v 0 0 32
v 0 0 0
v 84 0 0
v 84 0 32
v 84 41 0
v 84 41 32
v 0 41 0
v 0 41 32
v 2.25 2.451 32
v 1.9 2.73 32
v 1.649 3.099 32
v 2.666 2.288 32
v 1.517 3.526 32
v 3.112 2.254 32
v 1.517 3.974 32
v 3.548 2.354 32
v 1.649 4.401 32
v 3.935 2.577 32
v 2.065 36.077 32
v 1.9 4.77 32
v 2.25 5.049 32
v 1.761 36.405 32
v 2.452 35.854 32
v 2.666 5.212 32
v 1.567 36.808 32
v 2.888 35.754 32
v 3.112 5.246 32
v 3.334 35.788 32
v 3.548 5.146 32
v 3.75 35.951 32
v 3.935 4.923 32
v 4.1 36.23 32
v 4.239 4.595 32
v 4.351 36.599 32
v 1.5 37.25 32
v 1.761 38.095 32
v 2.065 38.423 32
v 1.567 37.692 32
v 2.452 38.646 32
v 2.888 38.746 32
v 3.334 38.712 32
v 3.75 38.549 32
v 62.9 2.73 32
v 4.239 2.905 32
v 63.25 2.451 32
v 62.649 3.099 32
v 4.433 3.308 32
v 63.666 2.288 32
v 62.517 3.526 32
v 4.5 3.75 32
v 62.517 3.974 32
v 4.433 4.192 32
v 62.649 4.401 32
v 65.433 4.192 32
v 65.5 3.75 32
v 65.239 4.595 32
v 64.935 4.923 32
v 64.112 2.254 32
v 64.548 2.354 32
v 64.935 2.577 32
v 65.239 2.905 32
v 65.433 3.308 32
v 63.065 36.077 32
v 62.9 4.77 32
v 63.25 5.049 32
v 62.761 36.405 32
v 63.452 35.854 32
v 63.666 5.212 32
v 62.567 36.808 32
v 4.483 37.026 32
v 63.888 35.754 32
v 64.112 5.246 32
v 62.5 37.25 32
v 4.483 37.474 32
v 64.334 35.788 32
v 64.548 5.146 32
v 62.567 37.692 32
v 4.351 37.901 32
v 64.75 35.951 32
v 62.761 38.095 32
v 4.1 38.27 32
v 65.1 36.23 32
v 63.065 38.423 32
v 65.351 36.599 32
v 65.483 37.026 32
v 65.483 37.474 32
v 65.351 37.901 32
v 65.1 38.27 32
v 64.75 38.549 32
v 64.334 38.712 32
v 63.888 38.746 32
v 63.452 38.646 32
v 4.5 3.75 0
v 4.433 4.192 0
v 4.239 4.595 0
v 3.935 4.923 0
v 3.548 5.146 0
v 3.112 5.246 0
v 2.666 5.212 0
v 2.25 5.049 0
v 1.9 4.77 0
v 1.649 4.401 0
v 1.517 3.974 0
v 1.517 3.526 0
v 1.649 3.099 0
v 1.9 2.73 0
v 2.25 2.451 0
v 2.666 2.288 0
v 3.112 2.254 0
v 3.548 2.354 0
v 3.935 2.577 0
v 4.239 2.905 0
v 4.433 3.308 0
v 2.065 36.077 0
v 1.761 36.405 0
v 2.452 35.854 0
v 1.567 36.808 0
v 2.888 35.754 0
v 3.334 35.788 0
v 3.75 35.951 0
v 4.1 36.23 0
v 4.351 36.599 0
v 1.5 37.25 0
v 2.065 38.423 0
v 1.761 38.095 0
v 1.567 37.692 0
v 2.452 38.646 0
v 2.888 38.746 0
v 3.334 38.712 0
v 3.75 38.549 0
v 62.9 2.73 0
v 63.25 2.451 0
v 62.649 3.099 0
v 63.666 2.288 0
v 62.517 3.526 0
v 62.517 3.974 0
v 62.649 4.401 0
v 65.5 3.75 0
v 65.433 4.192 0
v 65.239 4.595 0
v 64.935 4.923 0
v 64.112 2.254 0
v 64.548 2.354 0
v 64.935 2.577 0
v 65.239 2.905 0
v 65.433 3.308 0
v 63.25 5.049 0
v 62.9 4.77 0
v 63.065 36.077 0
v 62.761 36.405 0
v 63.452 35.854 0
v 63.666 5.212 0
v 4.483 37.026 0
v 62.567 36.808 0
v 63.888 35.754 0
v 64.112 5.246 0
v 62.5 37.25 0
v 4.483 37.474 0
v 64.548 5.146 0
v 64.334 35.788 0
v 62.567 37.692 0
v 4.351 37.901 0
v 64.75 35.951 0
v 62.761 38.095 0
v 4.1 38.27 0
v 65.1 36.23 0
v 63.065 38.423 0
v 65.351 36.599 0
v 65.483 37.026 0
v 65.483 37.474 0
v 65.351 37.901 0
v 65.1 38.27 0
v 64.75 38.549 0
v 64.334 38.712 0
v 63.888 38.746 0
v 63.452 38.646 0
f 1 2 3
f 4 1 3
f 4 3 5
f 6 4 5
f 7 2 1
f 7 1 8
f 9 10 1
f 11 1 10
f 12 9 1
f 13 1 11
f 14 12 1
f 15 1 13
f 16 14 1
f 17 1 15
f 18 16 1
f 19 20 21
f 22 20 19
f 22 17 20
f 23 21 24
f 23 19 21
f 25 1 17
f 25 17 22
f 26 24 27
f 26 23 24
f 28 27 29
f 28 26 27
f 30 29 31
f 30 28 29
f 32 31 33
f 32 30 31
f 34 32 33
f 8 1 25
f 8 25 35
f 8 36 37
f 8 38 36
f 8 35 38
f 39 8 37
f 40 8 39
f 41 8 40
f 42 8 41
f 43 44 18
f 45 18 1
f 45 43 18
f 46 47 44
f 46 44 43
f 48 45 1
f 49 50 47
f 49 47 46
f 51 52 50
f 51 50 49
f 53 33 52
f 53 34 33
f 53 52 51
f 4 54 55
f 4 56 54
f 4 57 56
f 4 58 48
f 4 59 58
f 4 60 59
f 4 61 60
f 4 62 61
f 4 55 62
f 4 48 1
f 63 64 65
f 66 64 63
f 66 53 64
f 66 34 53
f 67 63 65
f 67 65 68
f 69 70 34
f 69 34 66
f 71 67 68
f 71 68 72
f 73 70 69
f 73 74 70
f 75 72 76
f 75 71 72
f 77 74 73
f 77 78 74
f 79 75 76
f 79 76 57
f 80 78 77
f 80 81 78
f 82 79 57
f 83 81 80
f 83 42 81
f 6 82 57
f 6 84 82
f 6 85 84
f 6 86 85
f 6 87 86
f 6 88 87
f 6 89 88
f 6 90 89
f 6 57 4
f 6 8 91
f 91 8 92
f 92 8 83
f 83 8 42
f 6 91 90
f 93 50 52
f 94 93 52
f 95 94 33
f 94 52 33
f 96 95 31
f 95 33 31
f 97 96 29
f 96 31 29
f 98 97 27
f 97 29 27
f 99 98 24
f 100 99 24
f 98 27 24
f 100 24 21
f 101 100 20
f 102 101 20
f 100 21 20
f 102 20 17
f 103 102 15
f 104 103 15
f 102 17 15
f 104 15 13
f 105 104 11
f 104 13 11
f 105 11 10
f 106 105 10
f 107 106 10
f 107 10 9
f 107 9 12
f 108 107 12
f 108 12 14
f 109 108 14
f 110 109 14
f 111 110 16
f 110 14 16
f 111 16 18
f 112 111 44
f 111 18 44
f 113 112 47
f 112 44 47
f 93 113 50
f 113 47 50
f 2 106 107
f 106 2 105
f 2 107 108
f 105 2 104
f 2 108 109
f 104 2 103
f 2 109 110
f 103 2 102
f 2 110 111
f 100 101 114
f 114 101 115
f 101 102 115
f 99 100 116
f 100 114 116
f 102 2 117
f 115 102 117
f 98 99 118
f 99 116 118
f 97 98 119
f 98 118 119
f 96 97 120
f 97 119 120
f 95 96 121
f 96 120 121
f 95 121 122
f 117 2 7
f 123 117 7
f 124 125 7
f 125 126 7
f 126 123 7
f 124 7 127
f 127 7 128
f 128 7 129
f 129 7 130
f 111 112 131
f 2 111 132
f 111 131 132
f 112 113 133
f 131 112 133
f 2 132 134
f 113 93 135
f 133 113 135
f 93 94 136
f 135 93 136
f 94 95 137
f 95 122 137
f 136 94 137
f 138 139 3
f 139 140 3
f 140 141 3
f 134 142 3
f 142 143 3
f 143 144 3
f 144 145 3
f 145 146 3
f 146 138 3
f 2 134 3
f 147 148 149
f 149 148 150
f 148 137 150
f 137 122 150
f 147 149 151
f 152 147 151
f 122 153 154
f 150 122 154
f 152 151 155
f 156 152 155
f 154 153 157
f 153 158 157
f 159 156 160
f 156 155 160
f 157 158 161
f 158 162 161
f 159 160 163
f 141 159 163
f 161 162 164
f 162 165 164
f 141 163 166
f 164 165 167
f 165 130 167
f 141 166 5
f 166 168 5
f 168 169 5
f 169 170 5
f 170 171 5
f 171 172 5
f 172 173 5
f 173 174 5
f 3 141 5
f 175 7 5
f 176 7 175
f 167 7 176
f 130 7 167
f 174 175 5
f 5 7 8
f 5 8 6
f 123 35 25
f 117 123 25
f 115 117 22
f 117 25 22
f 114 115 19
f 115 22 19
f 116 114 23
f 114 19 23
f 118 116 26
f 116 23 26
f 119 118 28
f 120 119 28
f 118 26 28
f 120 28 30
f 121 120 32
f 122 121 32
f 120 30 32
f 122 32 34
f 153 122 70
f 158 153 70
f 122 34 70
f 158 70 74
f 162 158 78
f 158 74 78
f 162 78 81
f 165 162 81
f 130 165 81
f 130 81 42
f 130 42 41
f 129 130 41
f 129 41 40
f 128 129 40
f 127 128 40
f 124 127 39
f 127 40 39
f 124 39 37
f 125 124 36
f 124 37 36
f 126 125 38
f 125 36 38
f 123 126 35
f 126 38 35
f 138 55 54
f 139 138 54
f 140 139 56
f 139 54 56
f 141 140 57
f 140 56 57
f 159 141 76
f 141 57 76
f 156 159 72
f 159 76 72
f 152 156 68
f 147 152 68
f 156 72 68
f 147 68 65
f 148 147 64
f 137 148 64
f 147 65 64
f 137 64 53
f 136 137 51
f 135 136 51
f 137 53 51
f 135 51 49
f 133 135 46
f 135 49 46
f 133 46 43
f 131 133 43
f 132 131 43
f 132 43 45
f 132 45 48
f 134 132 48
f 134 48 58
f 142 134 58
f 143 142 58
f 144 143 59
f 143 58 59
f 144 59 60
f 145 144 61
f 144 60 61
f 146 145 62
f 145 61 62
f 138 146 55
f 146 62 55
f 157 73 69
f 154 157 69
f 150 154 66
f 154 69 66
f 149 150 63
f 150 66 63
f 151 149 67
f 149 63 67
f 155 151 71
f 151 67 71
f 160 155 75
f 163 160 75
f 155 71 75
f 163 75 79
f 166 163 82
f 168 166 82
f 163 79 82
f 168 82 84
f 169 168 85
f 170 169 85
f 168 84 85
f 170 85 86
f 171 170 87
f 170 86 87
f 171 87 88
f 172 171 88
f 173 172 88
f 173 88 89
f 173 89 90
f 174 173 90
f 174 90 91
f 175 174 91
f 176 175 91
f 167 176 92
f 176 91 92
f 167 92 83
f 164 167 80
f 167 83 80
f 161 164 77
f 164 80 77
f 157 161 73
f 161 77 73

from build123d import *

# Parameters (mm, degrees)
SKETCH_1_W          = 84
SKETCH_1_H          = 41
EXTRUDE_1_DEPTH     = 32
SKETCH_2_R          = 1.5
CUT_EXTRUDE_1_DEPTH = 32


with BuildPart() as part:
    # 草图1 → 凸台-拉伸1 (new body)
    with BuildSketch(Plane.XY):
        with Locations((42, 20.5)):
            Rectangle(SKETCH_1_W, SKETCH_1_H)
    extrude(amount=EXTRUDE_1_DEPTH)

    # 草图2 → 切除-拉伸1 (cut)
    with BuildSketch(Plane.XY.offset(32)):
        with Locations((3, 3.75)):
            Circle(SKETCH_2_R)
        with Locations((64, 3.75)):
            Circle(SKETCH_2_R)
        with Locations(Location((64, 37.25, 0), (0, 0, 180))):
            Circle(SKETCH_2_R)
        with Locations(Location((3, 37.25, 0), (0, 0, 180))):
            Circle(SKETCH_2_R)
    extrude(amount=-CUT_EXTRUDE_1_DEPTH, mode=Mode.SUBTRACT)


solid = part.part
